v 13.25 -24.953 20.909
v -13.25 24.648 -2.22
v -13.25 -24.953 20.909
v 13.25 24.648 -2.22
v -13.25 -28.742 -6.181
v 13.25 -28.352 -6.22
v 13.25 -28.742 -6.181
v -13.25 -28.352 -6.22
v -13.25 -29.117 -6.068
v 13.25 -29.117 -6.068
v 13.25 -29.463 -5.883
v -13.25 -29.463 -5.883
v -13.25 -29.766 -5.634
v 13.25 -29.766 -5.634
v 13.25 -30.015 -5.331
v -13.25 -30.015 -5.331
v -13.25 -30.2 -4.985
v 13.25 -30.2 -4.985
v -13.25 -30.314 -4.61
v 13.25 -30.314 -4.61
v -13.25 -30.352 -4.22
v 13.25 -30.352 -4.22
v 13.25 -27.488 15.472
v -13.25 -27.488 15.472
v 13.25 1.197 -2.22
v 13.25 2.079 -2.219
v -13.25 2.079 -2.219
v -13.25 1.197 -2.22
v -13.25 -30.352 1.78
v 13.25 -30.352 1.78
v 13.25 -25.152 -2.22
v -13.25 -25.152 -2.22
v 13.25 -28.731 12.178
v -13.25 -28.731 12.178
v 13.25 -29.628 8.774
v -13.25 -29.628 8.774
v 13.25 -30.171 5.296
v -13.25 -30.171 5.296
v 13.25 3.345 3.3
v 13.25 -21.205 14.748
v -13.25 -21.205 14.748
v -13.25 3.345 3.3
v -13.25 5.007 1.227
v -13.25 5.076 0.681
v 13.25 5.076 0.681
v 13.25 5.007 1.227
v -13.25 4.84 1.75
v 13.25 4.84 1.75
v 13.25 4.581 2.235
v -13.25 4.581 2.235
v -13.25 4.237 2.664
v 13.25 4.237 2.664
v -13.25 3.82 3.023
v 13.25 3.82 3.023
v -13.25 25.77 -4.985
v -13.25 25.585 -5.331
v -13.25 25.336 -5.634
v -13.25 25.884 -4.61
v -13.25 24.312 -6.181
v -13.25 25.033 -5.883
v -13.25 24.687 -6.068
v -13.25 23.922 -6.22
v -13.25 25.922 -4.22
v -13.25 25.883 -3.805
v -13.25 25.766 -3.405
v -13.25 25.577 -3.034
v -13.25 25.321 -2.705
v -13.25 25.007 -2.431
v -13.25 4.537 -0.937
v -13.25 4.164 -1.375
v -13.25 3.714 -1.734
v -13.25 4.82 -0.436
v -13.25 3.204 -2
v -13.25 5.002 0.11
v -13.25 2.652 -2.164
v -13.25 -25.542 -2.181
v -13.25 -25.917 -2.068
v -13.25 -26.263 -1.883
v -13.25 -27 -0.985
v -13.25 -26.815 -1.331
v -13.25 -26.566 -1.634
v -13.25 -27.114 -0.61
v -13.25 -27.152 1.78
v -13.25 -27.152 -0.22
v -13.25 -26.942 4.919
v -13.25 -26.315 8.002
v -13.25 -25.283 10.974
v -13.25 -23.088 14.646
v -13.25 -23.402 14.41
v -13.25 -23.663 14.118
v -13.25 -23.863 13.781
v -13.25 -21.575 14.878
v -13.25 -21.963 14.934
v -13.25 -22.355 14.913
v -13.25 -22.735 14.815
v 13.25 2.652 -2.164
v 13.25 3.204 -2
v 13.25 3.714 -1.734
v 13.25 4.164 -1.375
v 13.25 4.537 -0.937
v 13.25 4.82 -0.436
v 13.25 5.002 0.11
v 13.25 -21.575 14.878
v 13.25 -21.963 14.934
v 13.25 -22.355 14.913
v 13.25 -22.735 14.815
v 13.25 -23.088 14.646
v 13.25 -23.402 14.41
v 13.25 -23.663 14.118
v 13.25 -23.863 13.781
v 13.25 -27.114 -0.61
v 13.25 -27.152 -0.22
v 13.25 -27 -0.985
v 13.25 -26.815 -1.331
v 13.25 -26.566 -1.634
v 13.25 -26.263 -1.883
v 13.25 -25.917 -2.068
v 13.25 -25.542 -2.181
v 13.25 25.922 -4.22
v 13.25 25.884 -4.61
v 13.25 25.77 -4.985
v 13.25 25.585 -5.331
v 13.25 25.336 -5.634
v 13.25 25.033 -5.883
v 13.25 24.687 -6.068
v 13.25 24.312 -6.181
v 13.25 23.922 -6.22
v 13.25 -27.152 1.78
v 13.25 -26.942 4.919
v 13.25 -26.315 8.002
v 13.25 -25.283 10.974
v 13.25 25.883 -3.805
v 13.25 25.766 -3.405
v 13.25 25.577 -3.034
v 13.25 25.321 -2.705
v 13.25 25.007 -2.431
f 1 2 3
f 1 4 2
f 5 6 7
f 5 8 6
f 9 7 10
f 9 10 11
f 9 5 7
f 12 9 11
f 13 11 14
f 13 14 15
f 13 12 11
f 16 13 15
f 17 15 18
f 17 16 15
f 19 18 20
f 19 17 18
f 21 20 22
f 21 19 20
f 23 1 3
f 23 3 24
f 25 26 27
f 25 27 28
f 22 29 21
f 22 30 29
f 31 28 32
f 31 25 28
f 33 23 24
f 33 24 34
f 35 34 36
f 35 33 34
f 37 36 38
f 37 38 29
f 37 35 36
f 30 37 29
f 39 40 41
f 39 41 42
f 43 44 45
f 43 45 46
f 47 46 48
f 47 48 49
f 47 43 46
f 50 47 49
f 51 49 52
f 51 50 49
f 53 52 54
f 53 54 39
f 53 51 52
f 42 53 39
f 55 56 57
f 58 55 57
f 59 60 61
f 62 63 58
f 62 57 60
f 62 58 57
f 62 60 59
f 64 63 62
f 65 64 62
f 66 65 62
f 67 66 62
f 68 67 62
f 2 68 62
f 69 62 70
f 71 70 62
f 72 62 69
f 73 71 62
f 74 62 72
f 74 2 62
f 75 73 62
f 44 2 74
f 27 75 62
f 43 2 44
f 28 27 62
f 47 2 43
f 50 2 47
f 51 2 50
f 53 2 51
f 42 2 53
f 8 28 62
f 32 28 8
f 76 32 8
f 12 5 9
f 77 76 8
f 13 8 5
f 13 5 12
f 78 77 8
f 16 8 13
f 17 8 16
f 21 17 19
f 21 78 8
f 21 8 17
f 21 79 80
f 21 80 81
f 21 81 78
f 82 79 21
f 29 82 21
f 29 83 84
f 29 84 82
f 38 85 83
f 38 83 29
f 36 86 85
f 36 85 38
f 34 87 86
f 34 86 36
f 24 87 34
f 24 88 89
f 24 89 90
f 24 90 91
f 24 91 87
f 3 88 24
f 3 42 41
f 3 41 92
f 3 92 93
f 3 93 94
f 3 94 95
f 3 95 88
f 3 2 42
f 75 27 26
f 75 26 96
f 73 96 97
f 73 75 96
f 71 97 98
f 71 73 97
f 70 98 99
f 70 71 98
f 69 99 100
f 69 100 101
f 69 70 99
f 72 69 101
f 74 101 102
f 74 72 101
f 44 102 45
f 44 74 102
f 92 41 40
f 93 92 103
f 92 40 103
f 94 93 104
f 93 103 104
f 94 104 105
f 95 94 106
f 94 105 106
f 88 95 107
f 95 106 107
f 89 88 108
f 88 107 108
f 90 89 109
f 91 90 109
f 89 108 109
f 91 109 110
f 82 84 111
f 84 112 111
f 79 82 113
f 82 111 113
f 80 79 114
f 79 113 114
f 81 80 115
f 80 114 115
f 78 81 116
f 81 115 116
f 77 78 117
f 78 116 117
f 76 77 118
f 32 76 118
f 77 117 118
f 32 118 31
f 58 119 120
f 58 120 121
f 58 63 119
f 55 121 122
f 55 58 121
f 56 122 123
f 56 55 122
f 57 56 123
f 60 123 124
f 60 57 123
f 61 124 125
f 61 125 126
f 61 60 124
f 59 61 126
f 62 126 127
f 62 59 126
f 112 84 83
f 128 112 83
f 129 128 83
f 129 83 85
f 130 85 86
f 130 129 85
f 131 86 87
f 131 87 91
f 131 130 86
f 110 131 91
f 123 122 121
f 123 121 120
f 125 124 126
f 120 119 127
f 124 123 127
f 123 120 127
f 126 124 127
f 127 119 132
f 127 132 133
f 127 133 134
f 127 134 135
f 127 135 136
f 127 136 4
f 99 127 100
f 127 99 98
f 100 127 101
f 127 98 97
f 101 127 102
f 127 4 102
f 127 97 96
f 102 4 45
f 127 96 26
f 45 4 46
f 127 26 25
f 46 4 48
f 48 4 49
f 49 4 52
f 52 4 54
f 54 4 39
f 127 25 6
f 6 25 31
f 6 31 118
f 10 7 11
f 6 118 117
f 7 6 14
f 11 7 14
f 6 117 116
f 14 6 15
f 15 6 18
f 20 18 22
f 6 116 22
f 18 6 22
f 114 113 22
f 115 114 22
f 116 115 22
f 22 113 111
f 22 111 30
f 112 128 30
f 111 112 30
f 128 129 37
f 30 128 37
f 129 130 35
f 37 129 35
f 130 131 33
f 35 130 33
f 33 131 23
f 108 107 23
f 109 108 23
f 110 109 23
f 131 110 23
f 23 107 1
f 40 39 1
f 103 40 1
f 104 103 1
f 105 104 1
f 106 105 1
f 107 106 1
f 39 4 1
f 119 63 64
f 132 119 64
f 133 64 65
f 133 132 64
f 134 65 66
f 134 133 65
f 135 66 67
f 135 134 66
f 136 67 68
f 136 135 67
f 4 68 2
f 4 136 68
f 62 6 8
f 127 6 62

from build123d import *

# Parameters (mm, degrees)
F1_DEPTH    = 13.25
F2_DEPTH    = 13.25
F3_R        = 1.99999
F4_R        = 2
F5_T1_DEPTH = 26.5


# Not quite as in the source:
# - a fillet or chamfer that OpenCascade refuses, or shapes differently, is made with other operations: its cross-section is extruded or revolved along the edge and cut away or added
# - a fillet or chamfer is up to 0.001 mm smaller than in the source, because OpenCascade refuses the exact size
# - a feature names something its author has since deleted; it is built from what else it names


with BuildPart() as f1:
    # F0 (on Right) → F1 (new body, symmetric)
    with BuildSketch(Plane.YZ):
        with BuildLine():
            Line((24.6479697927, -2.219830174), (-24.9527402653, 20.909360776))
            Line((-24.9527402653, 20.909360776), (-27.4884498358, 15.4715140538))
            Line((-27.4884498358, 15.4715140538), (-23.8632186876, 13.7810410068))
            Line((-23.8632186876, 13.7810410068), (-23.0179821641, 15.5936565809))
            Line((-23.0179821641, 15.5936565809), (5.077559234, 2.4924904669))
            Line((5.077559234, 2.4924904669), (7.7964825951, 1.2246356817))
            Line((7.7964825951, 1.2246356817), (15.1652631053, -2.2114831015))
            Line((15.1652631053, -2.2114831015), (5.077559234, -2.2175114543))
            Line((5.077559234, -2.2175114543), (1.1974681402, -2.219830174))
            Line((1.1974681402, -2.219830174), (-27.1520302073, -2.219830174))
            Line((-27.1520302073, -2.219830174), (-27.1520302073, 1.780169826))
            Line((-27.1520302073, 1.780169826), (-30.3520302073, 1.780169826))
            Line((-30.3520302073, 1.780169826), (-30.3520302073, -6.219830174))
            Line((-30.3520302073, -6.219830174), (24.6479697927, -6.219830174))
            ThreePointArc((24.6479697927, -6.219830174), (25.9221103143, -4.219830174), (24.6479697927, -2.219830174))
        make_face()
        with BuildLine():
            Line((-23.8632186876, 13.7810410068), (-27.4884498358, 15.4715140538))
            ThreePointArc((-27.4884498358, 15.4715140538), (-29.6284726398, 8.7739706401), (-30.3520302073, 1.780169826))
            Line((-30.3520302073, 1.780169826), (-27.1520302073, 1.780169826))
            ThreePointArc((-27.1520302073, 1.780169826), (-26.3149438564, 8.0018494688), (-23.8632186876, 13.7810410068))
        make_face()
        Polygon((7.7964825951, 1.2246356817), (5.077559234, 2.4924904669), (5.077559234, -2.2175114543), (15.1652631053, -2.2114831015), align=None)
    extrude(amount=F1_DEPTH, both=True)

    # F0 (on Right) → F2 (join, symmetric)
    with BuildSketch(Plane.YZ):
        with BuildLine():
            Line((24.6479697927, -2.219830174), (-24.9527402653, 20.909360776))
            Line((-24.9527402653, 20.909360776), (-27.4884498358, 15.4715140538))
            Line((-27.4884498358, 15.4715140538), (-23.8632186876, 13.7810410068))
            Line((-23.8632186876, 13.7810410068), (-23.0179821641, 15.5936565809))
            Line((-23.0179821641, 15.5936565809), (5.077559234, 2.4924904669))
            Line((5.077559234, 2.4924904669), (7.7964825951, 1.2246356817))
            Line((7.7964825951, 1.2246356817), (15.1652631053, -2.2114831015))
            Line((15.1652631053, -2.2114831015), (5.077559234, -2.2175114543))
            Line((5.077559234, -2.2175114543), (1.1974681402, -2.219830174))
            Line((1.1974681402, -2.219830174), (-27.1520302073, -2.219830174))
            Line((-27.1520302073, -2.219830174), (-27.1520302073, 1.780169826))
            Line((-27.1520302073, 1.780169826), (-30.3520302073, 1.780169826))
            Line((-30.3520302073, 1.780169826), (-30.3520302073, -6.219830174))
            Line((-30.3520302073, -6.219830174), (24.6479697927, -6.219830174))
            ThreePointArc((24.6479697927, -6.219830174), (25.9221103143, -4.219830174), (24.6479697927, -2.219830174))
        make_face()
    extrude(amount=F2_DEPTH, both=True)

    # F3 (radius 2 in the source; OpenCascade refuses exactly that, so slightly less here)
    f3_edges = [f1.edges().sort_by_distance(p)[0] for p in [
        (0, -23.017982, 15.593657),
        (0, 24.64797, -2.21983),
        (0, 24.64797, -6.21983),
    ]]
    fillet(f3_edges, radius=F3_R)

    # F4
    f4_edges = [f1.edges().sort_by_distance(p)[0] for p in [
        (0, -27.15203, -2.21983),
        (0, -30.35203, -6.21983),
        (0, -30.35203, 1.78017),
    ]]
    fillet(f4_edges, radius=F4_R)

    # F5: fillet of radius 3 on 2 edges, made by hand

    # F5_s2 → F5_t1 (join)
    with BuildSketch(Plane.YZ.offset(-13.25)):
        with BuildLine():
            ThreePointArc((2.0793520161, -2.2193031654), (4.1995133271, -1.3399901057), (5.077559234, 0.780696299))
            Line((5.077559234, 0.780696299), (5.077559234, -2.2175114543))
            Line((5.077559234, -2.2175114543), (2.0793520161, -2.2193031654))
        make_face()
        with BuildLine():
            ThreePointArc((5.077559234, 0.5812796845), (4.6077335715, 2.1931785095), (3.3454140192, 3.3002030456))
            Line((3.3454140192, 3.3002030456), (5.077559234, 2.4924904669))
            Line((5.077559234, 2.4924904669), (5.077559234, 0.5812796845))
        make_face()
    extrude(amount=F5_T1_DEPTH)


solid = f1.part
